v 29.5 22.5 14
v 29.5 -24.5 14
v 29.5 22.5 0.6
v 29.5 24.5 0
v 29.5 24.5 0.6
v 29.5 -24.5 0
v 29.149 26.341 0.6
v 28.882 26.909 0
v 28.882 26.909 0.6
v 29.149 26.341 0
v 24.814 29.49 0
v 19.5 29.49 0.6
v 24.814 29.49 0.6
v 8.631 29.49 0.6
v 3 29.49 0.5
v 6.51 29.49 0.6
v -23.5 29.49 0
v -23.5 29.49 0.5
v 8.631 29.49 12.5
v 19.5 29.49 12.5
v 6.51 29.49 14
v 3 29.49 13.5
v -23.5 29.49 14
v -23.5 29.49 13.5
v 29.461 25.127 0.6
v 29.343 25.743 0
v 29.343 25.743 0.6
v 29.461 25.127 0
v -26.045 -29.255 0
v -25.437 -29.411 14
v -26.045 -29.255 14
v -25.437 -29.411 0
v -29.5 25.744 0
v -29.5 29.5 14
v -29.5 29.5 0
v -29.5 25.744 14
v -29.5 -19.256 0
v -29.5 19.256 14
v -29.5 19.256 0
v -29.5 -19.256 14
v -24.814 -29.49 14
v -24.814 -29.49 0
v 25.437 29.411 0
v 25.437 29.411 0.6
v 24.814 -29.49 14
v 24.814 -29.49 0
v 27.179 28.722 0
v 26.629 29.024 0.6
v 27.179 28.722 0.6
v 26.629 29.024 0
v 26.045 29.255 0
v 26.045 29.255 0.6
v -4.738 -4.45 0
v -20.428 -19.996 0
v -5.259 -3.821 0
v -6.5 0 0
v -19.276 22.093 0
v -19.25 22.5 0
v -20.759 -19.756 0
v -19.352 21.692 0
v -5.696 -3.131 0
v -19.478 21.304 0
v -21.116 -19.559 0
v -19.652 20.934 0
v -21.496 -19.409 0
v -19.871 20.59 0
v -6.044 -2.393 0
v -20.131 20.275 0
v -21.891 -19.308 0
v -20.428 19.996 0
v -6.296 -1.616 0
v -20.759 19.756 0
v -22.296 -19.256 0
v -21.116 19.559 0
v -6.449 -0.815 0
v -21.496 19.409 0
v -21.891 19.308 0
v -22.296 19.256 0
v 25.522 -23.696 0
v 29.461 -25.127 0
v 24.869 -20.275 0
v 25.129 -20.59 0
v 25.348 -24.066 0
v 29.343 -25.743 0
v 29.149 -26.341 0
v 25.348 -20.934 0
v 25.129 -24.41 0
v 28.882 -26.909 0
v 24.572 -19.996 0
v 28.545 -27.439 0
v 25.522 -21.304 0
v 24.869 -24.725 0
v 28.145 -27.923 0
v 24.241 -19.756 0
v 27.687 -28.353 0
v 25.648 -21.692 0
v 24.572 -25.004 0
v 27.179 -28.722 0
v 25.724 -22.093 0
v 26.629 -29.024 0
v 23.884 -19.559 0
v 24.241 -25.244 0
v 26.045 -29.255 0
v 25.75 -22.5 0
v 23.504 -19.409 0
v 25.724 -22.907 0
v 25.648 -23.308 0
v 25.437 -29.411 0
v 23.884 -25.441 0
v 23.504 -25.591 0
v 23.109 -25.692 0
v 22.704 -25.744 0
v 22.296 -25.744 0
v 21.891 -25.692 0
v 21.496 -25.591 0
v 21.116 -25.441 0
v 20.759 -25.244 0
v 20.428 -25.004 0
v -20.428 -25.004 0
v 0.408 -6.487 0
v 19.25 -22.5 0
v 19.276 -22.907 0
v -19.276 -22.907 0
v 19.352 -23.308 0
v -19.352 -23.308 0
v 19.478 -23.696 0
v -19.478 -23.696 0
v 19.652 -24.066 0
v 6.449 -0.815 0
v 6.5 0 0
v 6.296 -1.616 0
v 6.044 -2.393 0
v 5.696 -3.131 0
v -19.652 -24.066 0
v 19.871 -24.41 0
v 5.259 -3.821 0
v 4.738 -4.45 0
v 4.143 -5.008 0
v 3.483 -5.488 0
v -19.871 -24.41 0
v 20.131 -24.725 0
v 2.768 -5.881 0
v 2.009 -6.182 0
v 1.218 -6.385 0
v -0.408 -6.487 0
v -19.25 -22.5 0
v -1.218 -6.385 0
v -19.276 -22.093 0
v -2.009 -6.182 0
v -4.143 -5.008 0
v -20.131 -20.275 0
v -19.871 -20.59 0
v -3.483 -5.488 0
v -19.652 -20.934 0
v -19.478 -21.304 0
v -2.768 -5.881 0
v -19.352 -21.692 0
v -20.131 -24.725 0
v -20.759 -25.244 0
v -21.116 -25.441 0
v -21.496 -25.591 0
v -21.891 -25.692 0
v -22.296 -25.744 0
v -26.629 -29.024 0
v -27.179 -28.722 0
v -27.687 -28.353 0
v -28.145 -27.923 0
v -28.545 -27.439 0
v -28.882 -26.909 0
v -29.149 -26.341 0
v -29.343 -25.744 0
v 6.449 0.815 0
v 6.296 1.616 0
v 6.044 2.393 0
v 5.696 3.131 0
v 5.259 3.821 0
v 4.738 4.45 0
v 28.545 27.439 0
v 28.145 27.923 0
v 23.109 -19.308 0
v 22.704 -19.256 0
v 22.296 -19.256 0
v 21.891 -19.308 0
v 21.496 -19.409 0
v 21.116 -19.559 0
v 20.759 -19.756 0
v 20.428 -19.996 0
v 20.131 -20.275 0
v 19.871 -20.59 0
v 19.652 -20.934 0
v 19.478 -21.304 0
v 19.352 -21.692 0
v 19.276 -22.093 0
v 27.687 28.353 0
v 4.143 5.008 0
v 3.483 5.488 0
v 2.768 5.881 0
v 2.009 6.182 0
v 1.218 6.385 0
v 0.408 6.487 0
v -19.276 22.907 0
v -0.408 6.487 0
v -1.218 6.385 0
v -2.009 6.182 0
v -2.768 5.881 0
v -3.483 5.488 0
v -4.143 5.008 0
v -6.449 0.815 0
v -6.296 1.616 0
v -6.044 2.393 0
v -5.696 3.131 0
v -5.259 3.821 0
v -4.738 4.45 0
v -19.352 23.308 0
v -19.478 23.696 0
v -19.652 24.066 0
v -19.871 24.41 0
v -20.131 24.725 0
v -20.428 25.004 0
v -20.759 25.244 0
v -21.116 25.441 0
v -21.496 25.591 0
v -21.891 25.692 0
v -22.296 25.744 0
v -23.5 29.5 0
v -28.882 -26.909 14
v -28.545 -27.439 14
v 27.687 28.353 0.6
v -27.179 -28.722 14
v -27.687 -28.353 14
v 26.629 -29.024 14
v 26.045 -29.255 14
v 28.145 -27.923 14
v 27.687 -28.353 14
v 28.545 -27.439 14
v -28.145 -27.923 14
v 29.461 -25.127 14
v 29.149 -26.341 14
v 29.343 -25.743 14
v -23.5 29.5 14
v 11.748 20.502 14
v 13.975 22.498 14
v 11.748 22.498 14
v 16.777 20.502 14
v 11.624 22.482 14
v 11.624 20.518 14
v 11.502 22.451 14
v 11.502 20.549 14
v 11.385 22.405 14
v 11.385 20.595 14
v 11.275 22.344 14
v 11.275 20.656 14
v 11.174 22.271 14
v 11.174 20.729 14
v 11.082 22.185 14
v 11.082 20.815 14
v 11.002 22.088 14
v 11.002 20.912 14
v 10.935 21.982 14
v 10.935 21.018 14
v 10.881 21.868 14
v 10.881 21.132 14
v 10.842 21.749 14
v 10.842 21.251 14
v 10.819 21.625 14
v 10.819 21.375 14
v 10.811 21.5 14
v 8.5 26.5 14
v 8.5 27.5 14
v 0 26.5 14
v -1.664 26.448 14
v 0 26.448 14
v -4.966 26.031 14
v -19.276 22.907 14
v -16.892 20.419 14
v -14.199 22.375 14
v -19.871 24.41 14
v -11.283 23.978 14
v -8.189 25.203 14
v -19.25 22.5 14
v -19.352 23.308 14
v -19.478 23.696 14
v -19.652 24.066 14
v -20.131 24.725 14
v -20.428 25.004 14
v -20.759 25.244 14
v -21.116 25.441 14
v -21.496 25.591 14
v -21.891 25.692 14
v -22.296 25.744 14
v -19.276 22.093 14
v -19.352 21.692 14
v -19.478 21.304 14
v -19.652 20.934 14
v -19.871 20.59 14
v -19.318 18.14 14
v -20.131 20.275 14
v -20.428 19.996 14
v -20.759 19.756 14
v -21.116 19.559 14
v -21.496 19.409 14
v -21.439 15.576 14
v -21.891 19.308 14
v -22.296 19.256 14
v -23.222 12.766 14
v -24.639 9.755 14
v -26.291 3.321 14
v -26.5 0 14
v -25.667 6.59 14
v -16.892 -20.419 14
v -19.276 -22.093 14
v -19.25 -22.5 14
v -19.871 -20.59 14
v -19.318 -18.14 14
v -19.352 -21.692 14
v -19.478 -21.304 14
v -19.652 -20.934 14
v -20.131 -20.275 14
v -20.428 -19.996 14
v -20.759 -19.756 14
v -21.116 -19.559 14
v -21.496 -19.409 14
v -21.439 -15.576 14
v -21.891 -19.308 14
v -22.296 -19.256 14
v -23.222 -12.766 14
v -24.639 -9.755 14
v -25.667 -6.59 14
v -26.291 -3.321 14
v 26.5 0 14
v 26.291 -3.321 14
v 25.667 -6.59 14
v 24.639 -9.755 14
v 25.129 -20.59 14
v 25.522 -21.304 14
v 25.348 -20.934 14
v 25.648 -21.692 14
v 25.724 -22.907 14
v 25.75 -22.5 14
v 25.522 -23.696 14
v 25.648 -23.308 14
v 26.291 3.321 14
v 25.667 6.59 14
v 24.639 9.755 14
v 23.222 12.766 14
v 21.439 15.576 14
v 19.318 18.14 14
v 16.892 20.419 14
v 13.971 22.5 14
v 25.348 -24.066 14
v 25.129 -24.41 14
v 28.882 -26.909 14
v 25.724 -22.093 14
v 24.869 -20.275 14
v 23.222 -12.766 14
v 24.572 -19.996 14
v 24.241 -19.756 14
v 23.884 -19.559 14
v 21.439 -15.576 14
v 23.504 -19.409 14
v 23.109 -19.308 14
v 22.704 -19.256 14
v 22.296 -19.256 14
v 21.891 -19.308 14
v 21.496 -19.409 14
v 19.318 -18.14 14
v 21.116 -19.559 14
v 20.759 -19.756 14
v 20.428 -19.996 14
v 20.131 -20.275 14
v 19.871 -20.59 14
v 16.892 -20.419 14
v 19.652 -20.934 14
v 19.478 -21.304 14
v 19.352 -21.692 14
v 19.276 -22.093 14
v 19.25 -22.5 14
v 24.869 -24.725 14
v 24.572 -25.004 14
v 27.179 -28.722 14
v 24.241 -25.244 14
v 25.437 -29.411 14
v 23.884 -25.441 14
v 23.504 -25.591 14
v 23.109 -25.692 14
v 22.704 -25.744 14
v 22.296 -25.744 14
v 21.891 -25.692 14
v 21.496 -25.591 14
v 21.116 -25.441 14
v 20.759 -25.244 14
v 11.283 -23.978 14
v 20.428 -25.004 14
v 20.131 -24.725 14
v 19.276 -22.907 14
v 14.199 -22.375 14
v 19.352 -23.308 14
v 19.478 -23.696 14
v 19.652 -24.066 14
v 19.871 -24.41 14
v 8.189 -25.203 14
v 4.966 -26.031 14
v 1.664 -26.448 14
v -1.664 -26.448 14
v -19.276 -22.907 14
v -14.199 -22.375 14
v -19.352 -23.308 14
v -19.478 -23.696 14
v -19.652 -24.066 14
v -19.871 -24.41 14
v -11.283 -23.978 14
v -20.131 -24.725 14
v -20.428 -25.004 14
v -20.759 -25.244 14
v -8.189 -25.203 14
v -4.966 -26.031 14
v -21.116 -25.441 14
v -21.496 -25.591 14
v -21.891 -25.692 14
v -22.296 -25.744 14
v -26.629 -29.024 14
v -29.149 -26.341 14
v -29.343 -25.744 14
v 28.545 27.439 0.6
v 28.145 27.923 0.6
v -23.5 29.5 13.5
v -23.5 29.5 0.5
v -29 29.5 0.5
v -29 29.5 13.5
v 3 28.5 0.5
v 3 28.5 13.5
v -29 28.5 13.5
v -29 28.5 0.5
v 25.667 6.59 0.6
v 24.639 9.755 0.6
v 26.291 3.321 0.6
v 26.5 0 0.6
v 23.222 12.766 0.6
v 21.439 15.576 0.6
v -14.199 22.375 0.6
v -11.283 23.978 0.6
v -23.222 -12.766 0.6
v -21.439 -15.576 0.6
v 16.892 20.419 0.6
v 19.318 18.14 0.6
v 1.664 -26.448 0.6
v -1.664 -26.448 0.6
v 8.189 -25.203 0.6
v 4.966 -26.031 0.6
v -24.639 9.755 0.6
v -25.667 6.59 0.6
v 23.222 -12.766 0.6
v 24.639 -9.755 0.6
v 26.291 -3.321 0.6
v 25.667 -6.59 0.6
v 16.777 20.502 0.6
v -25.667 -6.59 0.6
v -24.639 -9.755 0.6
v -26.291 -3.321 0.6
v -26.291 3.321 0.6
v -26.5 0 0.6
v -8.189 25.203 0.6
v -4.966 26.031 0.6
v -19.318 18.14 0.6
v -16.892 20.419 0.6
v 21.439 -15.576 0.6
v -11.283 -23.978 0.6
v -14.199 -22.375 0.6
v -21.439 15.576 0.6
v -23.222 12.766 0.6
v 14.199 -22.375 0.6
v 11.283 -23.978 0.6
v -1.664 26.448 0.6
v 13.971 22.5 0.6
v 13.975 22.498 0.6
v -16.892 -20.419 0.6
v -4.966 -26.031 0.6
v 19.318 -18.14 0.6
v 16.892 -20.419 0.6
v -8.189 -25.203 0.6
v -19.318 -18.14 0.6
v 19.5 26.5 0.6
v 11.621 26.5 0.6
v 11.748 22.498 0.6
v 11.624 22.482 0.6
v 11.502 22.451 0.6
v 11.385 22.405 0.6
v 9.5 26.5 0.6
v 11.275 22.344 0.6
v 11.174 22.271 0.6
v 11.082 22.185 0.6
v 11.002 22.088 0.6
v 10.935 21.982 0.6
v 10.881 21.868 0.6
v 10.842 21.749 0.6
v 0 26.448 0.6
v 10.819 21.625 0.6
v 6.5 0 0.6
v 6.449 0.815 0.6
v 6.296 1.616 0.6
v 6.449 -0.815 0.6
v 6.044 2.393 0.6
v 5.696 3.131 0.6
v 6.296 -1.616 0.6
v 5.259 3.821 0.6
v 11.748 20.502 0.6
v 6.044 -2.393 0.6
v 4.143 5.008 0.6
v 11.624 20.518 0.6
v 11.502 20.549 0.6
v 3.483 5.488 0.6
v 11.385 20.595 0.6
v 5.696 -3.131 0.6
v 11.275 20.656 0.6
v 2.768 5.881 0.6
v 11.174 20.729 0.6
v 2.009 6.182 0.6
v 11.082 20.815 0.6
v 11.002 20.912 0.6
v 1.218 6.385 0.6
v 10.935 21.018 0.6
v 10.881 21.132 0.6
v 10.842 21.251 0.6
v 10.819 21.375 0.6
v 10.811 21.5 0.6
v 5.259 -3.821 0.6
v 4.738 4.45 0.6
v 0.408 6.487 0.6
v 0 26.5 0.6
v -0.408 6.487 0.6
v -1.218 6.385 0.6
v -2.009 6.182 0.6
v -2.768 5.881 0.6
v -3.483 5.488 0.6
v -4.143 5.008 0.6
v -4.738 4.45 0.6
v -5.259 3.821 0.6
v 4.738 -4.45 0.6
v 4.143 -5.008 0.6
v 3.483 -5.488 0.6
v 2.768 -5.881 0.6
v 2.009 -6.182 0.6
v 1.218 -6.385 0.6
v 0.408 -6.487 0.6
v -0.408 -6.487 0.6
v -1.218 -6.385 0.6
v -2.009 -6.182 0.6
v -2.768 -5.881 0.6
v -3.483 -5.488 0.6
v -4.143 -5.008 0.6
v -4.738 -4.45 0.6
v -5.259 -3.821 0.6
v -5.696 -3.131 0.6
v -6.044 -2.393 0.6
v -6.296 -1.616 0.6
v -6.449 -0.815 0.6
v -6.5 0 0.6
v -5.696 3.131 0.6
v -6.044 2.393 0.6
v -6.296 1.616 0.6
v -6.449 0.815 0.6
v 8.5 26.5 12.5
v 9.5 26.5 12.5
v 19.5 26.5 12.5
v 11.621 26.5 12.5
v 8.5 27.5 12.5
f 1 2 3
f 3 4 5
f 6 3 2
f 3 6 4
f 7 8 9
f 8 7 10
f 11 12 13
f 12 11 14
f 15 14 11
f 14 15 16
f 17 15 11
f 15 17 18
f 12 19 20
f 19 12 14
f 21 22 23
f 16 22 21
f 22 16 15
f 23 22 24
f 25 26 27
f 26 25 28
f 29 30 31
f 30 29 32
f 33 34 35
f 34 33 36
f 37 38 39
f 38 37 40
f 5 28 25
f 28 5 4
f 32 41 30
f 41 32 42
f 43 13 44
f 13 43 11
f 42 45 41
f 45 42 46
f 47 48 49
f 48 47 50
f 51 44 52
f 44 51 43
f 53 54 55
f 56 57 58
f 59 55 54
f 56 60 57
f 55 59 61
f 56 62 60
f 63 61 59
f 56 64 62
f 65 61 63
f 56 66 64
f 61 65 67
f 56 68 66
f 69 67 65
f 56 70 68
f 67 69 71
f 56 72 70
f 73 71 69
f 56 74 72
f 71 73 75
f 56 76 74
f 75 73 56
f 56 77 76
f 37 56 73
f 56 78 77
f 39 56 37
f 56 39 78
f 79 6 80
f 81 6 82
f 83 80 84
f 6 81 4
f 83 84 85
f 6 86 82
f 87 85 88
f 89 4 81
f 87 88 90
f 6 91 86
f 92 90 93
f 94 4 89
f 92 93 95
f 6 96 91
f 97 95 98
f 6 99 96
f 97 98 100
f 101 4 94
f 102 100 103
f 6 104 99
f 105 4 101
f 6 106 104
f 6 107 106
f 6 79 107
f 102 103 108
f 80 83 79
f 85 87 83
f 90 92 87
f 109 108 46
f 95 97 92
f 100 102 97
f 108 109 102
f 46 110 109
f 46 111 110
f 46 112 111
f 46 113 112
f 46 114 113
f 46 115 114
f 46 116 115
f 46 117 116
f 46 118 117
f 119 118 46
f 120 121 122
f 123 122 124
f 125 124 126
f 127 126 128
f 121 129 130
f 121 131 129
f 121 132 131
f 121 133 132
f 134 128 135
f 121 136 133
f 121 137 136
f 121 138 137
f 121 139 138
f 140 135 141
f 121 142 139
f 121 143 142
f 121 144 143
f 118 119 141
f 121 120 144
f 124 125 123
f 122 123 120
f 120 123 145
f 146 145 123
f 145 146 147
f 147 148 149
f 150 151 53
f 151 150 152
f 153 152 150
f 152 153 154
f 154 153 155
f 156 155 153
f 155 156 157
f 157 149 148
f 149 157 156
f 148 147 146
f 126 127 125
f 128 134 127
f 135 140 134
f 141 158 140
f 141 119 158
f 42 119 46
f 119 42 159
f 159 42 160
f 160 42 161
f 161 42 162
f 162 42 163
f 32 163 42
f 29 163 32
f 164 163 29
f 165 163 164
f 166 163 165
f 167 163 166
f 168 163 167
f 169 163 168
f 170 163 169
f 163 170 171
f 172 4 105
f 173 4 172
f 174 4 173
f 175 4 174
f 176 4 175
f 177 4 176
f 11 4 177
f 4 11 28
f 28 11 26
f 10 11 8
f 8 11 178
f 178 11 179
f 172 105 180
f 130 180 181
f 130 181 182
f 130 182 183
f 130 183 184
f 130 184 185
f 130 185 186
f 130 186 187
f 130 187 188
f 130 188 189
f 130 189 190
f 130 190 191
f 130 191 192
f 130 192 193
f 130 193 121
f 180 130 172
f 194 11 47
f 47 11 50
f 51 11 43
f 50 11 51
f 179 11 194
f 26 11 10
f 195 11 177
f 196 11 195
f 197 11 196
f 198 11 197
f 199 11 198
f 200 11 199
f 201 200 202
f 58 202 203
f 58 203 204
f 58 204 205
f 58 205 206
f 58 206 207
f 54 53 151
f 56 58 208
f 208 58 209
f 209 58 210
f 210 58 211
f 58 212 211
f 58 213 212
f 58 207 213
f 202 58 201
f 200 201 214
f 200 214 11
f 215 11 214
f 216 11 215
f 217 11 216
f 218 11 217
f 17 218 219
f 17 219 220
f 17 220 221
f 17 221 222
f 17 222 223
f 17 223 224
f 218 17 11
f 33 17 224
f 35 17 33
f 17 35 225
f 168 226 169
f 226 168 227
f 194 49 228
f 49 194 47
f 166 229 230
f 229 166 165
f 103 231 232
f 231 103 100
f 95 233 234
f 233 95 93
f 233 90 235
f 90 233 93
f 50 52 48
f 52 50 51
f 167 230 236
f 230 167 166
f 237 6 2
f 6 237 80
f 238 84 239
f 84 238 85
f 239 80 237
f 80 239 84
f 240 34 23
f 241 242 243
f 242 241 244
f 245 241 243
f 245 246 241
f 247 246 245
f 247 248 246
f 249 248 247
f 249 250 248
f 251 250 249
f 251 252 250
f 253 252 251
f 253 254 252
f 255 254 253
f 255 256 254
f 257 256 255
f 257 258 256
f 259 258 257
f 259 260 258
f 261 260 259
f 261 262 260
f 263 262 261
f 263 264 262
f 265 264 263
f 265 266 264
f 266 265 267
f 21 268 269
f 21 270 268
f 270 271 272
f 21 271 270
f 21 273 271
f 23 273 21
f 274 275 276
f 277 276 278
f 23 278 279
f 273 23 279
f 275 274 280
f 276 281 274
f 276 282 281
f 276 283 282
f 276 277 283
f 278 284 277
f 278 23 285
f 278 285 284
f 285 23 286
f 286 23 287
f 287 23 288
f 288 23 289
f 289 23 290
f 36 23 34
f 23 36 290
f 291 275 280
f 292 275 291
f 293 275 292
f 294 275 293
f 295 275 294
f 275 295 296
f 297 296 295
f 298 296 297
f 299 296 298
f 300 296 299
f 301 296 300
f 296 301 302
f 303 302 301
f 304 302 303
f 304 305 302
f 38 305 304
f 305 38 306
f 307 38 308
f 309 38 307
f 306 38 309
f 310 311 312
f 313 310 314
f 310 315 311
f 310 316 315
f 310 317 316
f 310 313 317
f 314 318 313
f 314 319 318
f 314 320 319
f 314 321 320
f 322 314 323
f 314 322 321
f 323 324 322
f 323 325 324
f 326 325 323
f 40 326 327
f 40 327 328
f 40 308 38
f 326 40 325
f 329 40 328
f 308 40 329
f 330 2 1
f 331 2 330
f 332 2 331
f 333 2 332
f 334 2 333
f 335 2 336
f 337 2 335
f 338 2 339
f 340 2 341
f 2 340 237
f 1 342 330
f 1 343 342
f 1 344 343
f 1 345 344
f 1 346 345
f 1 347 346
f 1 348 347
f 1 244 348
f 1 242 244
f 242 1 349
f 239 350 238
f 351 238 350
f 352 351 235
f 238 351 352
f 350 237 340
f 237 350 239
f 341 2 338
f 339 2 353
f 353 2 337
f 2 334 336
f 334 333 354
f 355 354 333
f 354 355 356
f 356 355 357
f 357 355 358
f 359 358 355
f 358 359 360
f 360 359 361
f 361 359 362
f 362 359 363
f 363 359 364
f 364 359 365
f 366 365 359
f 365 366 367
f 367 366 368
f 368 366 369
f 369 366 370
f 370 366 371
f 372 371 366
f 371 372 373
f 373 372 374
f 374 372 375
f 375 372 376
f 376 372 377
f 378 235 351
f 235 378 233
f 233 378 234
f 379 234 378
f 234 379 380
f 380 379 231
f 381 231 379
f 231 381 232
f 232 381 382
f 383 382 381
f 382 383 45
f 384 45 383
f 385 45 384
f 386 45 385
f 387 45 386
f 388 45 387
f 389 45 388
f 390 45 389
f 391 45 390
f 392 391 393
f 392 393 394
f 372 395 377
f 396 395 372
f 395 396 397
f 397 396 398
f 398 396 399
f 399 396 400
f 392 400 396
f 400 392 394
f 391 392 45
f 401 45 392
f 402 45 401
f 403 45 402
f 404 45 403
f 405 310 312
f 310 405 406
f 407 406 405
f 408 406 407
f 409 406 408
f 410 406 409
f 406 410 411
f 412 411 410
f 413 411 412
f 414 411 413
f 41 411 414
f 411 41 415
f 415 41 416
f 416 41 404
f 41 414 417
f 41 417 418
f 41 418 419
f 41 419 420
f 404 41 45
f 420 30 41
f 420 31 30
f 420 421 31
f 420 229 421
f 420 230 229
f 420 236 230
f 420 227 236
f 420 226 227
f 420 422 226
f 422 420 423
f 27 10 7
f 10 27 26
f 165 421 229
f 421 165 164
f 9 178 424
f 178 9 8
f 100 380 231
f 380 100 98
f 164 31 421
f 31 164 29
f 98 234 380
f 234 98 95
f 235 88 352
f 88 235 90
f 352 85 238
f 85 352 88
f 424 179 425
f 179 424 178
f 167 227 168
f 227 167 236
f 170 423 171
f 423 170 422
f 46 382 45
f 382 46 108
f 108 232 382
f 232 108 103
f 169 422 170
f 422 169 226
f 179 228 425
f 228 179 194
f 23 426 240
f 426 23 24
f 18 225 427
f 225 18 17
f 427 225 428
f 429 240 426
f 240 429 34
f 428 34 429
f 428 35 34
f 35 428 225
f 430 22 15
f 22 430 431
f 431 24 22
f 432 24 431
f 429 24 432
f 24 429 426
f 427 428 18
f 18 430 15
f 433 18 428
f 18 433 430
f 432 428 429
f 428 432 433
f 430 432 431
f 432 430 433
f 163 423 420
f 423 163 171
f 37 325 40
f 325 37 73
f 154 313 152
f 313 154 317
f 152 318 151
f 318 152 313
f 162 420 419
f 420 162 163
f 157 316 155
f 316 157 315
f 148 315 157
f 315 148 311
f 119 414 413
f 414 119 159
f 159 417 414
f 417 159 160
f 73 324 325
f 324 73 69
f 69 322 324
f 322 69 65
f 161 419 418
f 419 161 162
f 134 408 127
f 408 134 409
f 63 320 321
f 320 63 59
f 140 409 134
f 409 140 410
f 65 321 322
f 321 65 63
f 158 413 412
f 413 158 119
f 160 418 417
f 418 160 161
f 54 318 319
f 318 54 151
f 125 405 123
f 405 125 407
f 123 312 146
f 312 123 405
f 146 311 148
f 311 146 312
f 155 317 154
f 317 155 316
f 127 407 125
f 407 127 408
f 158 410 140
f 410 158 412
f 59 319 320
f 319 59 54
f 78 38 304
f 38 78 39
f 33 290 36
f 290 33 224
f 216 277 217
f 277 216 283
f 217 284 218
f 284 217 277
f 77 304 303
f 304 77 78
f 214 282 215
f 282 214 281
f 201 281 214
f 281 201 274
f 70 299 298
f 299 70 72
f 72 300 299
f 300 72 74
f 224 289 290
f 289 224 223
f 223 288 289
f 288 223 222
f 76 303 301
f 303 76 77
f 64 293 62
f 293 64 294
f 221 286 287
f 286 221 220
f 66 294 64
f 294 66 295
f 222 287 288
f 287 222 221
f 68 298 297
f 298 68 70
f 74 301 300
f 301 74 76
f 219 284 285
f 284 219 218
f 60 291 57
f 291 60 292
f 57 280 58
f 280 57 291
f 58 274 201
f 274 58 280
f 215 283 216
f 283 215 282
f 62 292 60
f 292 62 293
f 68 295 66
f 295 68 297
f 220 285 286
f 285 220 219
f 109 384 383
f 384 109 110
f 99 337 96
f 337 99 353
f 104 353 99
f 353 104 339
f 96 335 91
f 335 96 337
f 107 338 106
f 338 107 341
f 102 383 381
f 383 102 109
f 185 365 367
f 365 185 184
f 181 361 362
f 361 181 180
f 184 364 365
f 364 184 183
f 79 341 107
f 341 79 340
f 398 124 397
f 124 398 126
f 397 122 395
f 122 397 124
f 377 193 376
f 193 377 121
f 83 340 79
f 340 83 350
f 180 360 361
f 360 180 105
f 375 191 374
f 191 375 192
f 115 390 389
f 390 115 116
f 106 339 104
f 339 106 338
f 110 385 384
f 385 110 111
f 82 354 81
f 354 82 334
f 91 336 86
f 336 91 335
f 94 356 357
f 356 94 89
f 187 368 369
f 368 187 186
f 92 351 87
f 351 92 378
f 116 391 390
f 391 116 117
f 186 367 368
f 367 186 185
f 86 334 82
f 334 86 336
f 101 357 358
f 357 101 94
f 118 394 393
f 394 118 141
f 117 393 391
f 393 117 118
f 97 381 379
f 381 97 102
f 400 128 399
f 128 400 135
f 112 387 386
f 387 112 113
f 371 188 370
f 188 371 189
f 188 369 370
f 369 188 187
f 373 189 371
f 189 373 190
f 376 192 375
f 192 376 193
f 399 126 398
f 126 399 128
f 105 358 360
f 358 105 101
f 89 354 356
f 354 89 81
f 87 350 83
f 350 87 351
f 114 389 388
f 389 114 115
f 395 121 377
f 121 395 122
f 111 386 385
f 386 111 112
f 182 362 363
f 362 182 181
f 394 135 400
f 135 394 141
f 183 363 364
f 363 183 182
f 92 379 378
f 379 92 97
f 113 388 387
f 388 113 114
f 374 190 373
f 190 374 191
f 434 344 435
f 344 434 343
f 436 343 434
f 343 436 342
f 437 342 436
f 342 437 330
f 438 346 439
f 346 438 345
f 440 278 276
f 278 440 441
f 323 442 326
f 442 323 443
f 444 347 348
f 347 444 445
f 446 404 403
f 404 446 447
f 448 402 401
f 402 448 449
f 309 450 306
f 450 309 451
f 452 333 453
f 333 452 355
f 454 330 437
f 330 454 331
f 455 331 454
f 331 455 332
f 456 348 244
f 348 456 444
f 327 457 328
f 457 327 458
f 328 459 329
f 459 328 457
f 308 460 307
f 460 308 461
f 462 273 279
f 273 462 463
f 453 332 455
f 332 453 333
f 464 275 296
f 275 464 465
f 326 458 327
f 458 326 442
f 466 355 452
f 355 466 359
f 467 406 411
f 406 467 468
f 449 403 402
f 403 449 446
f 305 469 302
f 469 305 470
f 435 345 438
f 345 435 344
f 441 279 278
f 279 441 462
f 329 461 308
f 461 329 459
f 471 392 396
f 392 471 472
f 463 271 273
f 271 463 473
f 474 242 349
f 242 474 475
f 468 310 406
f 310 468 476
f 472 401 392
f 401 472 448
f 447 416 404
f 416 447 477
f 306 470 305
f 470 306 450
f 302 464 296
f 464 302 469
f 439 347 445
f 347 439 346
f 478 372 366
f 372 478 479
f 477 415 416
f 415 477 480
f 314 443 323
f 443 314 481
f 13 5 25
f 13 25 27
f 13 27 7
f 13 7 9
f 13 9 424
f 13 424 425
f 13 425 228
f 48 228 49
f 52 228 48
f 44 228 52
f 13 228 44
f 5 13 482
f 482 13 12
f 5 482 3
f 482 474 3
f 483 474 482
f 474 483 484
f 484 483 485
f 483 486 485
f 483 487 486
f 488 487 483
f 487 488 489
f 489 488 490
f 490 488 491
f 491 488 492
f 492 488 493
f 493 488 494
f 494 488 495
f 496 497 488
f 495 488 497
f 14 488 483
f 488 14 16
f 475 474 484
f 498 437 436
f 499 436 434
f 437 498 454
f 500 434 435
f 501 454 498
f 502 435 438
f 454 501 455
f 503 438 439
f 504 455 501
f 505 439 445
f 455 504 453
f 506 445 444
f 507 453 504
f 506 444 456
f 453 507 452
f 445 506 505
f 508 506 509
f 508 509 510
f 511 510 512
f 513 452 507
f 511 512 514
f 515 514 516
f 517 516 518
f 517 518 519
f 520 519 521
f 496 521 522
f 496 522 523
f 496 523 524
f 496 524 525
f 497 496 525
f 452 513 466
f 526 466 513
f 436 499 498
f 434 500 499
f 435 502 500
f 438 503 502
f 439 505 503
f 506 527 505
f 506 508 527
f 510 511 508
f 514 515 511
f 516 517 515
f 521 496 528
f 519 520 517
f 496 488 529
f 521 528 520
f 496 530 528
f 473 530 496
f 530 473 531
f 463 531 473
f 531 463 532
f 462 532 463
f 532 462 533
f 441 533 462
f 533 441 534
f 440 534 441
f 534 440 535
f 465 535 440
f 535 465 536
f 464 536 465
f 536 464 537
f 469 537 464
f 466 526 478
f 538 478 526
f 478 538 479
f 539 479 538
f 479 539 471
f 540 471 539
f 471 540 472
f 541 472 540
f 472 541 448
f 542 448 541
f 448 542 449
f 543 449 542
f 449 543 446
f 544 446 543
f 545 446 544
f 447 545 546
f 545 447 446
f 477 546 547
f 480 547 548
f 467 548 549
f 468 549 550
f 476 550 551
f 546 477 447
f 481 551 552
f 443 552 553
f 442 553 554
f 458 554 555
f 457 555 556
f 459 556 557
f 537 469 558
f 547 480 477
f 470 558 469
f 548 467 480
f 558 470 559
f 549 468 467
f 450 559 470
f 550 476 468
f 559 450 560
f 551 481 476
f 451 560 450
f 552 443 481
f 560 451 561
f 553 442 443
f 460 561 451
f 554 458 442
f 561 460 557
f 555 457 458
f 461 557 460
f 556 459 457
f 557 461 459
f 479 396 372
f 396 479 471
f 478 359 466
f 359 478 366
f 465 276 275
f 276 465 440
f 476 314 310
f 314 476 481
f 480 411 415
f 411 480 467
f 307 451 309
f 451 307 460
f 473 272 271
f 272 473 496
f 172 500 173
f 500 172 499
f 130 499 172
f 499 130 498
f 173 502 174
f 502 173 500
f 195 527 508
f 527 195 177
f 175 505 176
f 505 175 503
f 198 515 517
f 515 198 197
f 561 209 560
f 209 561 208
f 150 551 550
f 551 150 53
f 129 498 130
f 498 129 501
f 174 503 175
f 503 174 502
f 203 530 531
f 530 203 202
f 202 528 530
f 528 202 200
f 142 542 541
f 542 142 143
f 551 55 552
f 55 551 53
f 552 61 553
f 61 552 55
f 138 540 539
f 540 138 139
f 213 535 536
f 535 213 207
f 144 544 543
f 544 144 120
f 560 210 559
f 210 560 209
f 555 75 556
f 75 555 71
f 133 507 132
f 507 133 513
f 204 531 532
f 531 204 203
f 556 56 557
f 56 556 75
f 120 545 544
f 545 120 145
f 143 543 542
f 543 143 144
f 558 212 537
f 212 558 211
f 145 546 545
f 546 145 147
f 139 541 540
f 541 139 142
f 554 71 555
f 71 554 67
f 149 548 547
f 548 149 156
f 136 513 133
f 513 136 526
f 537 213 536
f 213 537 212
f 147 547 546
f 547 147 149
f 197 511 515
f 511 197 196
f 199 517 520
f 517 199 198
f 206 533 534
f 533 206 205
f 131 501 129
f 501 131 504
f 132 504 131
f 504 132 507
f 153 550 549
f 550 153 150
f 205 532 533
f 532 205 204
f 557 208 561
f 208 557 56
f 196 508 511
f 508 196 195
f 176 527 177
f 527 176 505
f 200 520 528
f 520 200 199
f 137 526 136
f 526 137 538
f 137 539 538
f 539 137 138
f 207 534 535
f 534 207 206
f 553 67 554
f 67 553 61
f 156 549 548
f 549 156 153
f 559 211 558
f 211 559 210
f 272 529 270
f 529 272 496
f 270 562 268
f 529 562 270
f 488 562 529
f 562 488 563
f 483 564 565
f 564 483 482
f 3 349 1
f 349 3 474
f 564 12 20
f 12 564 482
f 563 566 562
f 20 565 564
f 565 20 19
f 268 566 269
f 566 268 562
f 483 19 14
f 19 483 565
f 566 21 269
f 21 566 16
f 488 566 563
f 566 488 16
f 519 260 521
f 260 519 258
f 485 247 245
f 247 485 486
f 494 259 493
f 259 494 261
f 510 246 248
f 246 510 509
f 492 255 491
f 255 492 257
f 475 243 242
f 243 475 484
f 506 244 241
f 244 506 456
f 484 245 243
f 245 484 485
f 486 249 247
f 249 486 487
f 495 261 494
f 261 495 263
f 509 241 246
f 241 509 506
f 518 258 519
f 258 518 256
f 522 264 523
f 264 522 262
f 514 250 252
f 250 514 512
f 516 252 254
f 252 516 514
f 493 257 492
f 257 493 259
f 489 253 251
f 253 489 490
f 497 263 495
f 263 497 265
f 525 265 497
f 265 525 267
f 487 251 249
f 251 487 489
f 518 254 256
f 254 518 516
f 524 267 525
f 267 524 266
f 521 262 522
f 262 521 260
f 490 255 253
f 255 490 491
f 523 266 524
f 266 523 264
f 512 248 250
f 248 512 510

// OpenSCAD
$fn = 50;


union() {
	difference() {
		union() {
			translate(v = [0, 0, 0]) {
				rotate(a = [0, 0, 0]) {
					hull() {
						translate(v = [-24.5000000000, 24.5000000000, 0]) {
							rotate(a = [0, 0, 0]) {
								translate(v = [0, 0, 0]) {
									rotate(a = [0, 0, 0]) {
										cylinder(h = 14, r = 5);
									}
								}
							}
						}
						translate(v = [24.5000000000, 24.5000000000, 0]) {
							rotate(a = [0, 0, 0]) {
								translate(v = [0, 0, 0]) {
									rotate(a = [0, 0, 0]) {
										cylinder(h = 14, r = 5);
									}
								}
							}
						}
						translate(v = [-24.5000000000, -24.5000000000, 0]) {
							rotate(a = [0, 0, 0]) {
								translate(v = [0, 0, 0]) {
									rotate(a = [0, 0, 0]) {
										cylinder(h = 14, r = 5);
									}
								}
							}
						}
						translate(v = [24.5000000000, -24.5000000000, 0]) {
							rotate(a = [0, 0, 0]) {
								translate(v = [0, 0, 0]) {
									rotate(a = [0, 0, 0]) {
										cylinder(h = 14, r = 5);
									}
								}
							}
						}
					}
				}
			}
			translate(v = [-29.5000000000, 23.5000000000, 0]) {
				rotate(a = [0, 0, 0]) {
					cube(size = [6, 6, 14]);
				}
			}
		}
		union() {
			#translate(v = [-29.0000000000, 28.5000000000, 0.5000000000]) {
				rotate(a = [0, 0, 0]) {
					cube(size = [32, 1, 13.0000000000]);
				}
			}
			translate(v = [-30.0000000000, -22.5000000000, -125]) {
				rotate(a = [0, 0, 0]) {
					hull() {
						translate(v = [7.5000000000, 0, 0]) {
							rotate(a = [0, 0, 0]) {
								translate(v = [0, 0, 0]) {
									rotate(a = [0, 0, 0]) {
										cylinder(h = 250, r = 3.2500000000);
									}
								}
							}
						}
						translate(v = [-7.5000000000, 0, 0]) {
							rotate(a = [0, 0, 0]) {
								translate(v = [0, 0, 0]) {
									rotate(a = [0, 0, 0]) {
										cylinder(h = 250, r = 3.2500000000);
									}
								}
							}
						}
					}
				}
			}
			translate(v = [-30.0000000000, 22.5000000000, -125]) {
				rotate(a = [0, 0, 0]) {
					hull() {
						translate(v = [7.5000000000, 0, 0]) {
							rotate(a = [0, 0, 0]) {
								translate(v = [0, 0, 0]) {
									rotate(a = [0, 0, 0]) {
										cylinder(h = 250, r = 3.2500000000);
									}
								}
							}
						}
						translate(v = [-7.5000000000, 0, 0]) {
							rotate(a = [0, 0, 0]) {
								translate(v = [0, 0, 0]) {
									rotate(a = [0, 0, 0]) {
										cylinder(h = 250, r = 3.2500000000);
									}
								}
							}
						}
					}
				}
			}
			translate(v = [22.5000000000, -22.5000000000, -125.0000000000]) {
				rotate(a = [0, 0, 0]) {
					cylinder(h = 250, r = 3.2500000000);
				}
			}
			translate(v = [0, 0, 0.6000000000]) {
				rotate(a = [0, 0, 0]) {
					cylinder(h = 16.4000000000, r = 26.5000000000);
				}
			}
			translate(v = [0, 0, -7.0000000000]) {
				rotate(a = [0, 0, 0]) {
					cylinder(h = 14, r = 6.5000000000);
				}
			}
			translate(v = [0.0000000000, 22.5000000000, 0.6000000000]) {
				rotate(a = [0, 0, 0]) {
					cube(size = [29.5000000000, 4, 16.4000000000]);
				}
			}
			translate(v = [19.5000000000, 22.5000000000, 0.6000000000]) {
				rotate(a = [0, 0, 0]) {
					cube(size = [10, 7, 16.4000000000]);
				}
			}
			translate(v = [8.5000000000, 22.5000000000, 12.5000000000]) {
				rotate(a = [0, 0, 0]) {
					cube(size = [21, 7, 1.5000000000]);
				}
			}
			translate(v = [5.7500000000, 30.2500000000, 0.6000000000]) {
				rotate(a = [0, 0, -45]) {
					cube(size = [7.5000000000, 1.5000000000, 16.4000000000]);
				}
			}
			translate(v = [5.0610000000, 20.5000000000, 0.6000000000]) {
				rotate(a = [0, 0, 0]) {
					cube(size = [7.5000000000, 2, 13.4000000000]);
				}
			}
		}
	}
	union() {
		translate(v = [14.3110000000, 21.5000000000, 0]) {
			rotate(a = [0, 0, 0]) {
				hull() {
					translate(v = [2.5000000000, 0, 0]) {
						rotate(a = [0, 0, 0]) {
							#translate(v = [0, 0, 0]) {
								rotate(a = [0, 0, 0]) {
									cylinder(h = 14, r = 1.0000000000);
								}
							}
						}
					}
					translate(v = [-2.5000000000, 0, 0]) {
						rotate(a = [0, 0, 0]) {
							#translate(v = [0, 0, 0]) {
								rotate(a = [0, 0, 0]) {
									cylinder(h = 14, r = 1.0000000000);
								}
							}
						}
					}
				}
			}
		}
	}
}
